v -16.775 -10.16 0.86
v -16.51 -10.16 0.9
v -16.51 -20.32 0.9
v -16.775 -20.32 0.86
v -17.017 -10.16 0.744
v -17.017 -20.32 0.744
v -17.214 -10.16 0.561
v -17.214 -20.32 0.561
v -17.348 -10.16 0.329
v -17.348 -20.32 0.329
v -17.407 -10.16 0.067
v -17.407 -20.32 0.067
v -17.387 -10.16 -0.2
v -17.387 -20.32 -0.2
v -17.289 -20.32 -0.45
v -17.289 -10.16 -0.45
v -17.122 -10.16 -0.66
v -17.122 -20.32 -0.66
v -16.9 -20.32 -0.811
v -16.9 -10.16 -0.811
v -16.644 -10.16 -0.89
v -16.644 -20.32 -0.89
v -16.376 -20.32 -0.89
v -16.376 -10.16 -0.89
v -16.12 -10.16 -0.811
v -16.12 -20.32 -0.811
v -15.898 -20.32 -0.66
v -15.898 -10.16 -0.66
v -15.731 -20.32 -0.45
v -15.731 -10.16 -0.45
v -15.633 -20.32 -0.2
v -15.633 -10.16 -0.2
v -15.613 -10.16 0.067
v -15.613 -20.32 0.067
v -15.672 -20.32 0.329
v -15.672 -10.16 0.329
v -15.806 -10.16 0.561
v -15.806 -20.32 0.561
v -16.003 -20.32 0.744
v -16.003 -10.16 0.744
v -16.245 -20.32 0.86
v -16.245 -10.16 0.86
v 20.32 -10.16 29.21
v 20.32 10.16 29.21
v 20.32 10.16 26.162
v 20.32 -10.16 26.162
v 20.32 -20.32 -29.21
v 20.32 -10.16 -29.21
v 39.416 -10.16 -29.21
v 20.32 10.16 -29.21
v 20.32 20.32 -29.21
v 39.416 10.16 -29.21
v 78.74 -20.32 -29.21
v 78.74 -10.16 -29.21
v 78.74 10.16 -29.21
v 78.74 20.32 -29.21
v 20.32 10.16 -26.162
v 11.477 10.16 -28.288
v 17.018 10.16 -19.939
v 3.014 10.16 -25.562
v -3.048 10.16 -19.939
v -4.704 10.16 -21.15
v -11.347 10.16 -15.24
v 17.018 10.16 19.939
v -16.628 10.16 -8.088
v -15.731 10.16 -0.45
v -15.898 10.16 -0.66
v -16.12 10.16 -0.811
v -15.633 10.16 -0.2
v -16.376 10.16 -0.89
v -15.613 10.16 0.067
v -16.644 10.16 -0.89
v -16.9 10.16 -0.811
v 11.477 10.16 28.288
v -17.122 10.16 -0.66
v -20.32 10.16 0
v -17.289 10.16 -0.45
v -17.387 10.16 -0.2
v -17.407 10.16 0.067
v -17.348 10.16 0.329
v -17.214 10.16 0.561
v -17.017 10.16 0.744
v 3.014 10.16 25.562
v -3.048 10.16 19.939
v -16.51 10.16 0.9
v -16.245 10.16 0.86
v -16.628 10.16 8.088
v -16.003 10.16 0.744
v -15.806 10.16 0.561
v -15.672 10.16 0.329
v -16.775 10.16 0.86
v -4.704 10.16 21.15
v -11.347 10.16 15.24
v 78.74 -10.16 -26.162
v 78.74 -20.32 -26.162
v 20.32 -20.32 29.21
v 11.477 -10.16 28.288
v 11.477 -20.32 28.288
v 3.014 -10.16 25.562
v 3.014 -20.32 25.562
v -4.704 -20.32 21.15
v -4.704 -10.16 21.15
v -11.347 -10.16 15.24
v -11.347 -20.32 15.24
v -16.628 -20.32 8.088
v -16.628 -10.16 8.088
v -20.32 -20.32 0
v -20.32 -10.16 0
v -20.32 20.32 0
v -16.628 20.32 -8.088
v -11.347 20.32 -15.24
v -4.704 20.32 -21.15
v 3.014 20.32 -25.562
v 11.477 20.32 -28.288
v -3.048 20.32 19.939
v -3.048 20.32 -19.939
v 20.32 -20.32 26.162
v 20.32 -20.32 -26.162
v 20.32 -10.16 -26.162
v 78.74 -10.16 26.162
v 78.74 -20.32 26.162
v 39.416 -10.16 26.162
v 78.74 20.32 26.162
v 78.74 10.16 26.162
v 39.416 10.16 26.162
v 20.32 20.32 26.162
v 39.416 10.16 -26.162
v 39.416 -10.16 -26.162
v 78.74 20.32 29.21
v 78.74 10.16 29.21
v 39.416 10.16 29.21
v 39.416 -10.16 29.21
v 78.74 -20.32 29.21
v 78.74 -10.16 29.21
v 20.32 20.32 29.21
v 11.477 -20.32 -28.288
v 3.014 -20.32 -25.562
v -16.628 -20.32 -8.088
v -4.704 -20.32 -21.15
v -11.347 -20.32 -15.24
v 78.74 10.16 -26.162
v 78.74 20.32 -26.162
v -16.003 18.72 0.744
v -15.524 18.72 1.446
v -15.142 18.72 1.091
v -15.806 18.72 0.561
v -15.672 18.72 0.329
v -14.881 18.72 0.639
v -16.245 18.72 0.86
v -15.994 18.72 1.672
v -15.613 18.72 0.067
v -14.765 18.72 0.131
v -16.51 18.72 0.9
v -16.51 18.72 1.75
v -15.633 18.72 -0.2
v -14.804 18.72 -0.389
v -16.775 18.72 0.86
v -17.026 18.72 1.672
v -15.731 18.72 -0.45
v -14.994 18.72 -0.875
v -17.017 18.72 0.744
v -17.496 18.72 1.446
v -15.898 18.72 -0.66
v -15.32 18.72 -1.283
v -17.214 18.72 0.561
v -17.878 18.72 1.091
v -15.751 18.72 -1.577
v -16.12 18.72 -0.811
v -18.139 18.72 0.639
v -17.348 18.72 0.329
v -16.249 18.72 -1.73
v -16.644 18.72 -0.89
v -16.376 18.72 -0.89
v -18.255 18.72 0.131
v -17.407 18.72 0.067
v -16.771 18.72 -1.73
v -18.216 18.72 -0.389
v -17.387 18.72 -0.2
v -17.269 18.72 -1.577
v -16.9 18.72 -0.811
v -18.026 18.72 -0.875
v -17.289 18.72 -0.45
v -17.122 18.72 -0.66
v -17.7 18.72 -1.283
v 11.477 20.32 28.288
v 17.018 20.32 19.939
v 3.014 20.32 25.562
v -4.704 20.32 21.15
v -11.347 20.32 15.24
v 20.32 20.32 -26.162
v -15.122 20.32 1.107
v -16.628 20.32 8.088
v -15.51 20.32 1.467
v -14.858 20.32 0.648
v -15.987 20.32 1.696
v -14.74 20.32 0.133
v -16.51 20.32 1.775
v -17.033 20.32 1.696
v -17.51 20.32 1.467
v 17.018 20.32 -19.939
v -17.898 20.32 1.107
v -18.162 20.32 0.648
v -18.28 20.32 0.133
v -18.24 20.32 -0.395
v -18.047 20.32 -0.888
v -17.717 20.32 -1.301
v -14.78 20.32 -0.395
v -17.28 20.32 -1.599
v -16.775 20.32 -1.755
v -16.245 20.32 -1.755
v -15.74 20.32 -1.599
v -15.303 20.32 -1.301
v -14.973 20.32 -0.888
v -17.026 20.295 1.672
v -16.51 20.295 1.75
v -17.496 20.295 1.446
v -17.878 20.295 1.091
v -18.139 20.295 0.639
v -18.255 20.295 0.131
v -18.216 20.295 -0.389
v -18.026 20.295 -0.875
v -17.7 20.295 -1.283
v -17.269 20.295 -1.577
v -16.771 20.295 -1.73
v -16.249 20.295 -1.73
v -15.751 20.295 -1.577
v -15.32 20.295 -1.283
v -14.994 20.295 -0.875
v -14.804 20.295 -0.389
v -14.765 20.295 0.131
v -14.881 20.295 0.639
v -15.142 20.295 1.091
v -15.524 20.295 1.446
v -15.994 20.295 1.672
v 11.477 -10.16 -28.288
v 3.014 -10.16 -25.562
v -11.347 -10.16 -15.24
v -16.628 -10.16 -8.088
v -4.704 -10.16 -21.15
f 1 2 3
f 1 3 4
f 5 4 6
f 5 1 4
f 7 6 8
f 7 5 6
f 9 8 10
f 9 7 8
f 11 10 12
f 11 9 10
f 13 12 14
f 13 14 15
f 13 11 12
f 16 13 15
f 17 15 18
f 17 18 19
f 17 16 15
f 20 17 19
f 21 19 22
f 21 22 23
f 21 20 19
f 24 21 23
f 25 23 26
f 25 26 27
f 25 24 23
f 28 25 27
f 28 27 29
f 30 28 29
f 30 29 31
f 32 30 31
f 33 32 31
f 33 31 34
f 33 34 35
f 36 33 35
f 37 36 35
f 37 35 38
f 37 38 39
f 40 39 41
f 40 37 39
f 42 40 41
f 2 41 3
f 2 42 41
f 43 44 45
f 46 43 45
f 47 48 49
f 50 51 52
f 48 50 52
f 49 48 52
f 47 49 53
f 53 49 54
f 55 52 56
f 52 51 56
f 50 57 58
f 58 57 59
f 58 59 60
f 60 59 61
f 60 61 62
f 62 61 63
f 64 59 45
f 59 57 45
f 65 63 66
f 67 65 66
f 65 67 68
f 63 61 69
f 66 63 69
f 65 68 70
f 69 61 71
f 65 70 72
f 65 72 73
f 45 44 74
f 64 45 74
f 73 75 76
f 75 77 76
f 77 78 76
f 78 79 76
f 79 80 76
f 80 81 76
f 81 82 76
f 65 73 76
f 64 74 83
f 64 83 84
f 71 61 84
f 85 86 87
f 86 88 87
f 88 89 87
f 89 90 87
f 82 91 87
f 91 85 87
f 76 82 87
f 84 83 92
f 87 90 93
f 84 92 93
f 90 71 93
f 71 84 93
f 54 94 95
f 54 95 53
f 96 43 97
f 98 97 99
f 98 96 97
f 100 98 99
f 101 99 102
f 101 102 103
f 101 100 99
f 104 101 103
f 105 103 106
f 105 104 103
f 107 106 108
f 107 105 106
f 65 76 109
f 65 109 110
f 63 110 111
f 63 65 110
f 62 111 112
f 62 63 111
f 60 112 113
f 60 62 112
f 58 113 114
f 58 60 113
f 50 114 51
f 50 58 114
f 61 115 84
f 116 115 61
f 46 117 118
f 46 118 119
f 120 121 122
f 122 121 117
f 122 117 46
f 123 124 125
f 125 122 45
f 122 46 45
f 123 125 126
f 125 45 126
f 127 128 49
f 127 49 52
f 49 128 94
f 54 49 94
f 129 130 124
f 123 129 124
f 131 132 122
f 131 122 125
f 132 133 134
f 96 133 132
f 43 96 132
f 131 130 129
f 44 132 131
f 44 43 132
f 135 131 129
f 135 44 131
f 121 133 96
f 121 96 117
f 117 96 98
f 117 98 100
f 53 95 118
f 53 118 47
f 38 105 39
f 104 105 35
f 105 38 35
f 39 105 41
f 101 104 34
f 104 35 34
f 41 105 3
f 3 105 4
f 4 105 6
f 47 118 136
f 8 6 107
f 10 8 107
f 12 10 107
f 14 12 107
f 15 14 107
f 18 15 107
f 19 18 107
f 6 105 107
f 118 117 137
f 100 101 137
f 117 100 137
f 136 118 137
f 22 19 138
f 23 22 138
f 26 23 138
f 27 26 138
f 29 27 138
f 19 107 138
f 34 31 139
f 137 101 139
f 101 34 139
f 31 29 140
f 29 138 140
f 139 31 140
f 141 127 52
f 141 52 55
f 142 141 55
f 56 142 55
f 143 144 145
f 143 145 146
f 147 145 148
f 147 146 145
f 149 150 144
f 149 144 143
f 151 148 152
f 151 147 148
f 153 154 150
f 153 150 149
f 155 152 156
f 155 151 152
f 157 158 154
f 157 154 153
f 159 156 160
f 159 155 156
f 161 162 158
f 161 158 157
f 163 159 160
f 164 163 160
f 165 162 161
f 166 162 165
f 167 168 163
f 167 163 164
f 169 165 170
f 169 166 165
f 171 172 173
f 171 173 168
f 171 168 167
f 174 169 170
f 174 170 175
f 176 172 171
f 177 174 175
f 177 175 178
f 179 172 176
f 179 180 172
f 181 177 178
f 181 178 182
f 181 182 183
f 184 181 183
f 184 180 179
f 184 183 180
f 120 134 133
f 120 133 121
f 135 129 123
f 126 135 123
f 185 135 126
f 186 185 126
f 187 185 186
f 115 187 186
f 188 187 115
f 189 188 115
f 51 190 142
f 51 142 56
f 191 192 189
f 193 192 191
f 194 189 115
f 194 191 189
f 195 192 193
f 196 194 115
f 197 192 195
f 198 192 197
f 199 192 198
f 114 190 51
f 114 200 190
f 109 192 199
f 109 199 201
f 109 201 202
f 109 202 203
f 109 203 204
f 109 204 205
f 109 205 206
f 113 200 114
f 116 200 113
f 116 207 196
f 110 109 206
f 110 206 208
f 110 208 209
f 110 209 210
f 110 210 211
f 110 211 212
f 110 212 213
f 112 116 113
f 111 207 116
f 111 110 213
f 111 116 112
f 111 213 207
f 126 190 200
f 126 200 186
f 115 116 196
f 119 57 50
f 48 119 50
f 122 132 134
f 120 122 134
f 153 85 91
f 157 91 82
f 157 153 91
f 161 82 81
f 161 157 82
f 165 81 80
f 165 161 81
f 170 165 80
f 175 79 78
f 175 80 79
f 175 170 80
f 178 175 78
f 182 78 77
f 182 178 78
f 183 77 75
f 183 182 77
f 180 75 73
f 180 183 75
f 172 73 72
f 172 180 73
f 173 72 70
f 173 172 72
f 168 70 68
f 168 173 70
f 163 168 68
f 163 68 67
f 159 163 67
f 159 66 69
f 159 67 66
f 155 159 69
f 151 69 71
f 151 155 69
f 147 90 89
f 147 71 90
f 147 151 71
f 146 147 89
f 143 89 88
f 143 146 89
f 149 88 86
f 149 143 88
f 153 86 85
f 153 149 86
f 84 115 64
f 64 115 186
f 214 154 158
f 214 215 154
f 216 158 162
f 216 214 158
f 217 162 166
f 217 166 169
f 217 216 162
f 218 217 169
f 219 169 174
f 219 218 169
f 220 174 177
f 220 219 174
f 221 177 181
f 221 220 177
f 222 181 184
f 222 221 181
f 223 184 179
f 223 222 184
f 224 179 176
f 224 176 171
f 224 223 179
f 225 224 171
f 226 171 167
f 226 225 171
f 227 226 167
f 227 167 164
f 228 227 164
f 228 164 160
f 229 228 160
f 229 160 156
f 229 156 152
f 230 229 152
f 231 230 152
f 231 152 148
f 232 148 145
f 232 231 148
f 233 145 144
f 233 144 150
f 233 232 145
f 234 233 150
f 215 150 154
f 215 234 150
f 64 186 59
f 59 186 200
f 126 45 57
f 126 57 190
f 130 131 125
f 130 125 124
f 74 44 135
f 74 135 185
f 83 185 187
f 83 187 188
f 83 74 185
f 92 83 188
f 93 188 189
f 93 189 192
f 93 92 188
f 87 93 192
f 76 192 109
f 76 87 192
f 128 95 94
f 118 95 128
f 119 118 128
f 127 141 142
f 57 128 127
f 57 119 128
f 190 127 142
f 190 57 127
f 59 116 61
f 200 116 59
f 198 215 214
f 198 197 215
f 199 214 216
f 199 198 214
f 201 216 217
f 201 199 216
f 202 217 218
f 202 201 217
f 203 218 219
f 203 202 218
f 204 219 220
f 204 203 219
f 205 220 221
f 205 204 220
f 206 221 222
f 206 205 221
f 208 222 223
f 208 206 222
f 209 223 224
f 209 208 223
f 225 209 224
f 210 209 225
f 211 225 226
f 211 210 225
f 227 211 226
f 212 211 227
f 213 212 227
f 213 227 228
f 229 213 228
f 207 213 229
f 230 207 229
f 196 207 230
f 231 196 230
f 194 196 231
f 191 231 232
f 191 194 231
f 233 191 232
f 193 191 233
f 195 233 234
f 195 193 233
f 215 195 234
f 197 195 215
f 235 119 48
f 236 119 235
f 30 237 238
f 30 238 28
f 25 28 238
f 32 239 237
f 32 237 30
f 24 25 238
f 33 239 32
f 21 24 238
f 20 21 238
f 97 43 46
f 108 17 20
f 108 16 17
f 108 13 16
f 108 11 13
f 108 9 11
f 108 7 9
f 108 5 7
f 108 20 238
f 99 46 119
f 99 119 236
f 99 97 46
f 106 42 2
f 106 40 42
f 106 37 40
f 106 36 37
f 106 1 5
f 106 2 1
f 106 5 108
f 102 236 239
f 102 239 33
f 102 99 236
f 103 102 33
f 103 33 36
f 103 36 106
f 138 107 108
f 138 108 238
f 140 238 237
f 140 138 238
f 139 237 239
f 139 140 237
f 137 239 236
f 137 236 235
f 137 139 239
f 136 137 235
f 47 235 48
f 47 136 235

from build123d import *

# Parameters (mm, degrees)
SKETCH1_W           = 20.32
SKETCH1_H           = 10.16
BOSS_EXTRUDE1_DEPTH = 29.21
SKETCH1_4_W         = 40.64
SKETCH1_4_H         = 10.16
BOSS_EXTRUDE2_DEPTH = 29.21
SKETCH5_W           = 3.048
SKETCH5_H           = 40.64
BOSS_EXTRUDE4_DEPTH = 58.42
SKETCH10_W          = 39.323622634
SKETCH10_H          = 20.32
CUT_EXTRUDE2_DEPTH  = 101.12884899
CUT_EXTRUDE4_DEPTH  = 58.42
CUT_EXTRUDE5_REACH  = 95.3
SKETCH13_W          = 20.066
SKETCH13_H          = 39.878


with BuildPart() as part:
    # Sketch1 → Boss-Extrude1 (new, symmetric)
    with BuildSketch(Plane.XY):
        with Locations((-10.16, 15.24)):
            Rectangle(SKETCH1_W, SKETCH1_H)
    boss_extrude1 = extrude(amount=BOSS_EXTRUDE1_DEPTH, both=True)

    # Mirror1: Boss-Extrude1 across plane
    add(boss_extrude1.mirror(Plane(origin=(0, 0, 0), x_dir=(0, 0, 1), z_dir=(1, 0, 0))))



with BuildPart() as body_2:
    # Sketch1<4> → Boss-Extrude2 (new, symmetric)
    with BuildSketch(Plane.XY):
        with Locations((0, -15.24)):
            Rectangle(SKETCH1_4_W, SKETCH1_4_H)
    extrude(amount=BOSS_EXTRUDE2_DEPTH, both=True)


with BuildPart() as part_1:
    add(part.part)

    add(body_2.part)  # Boss-Extrude4 merges body 2
    # Sketch5 → Boss-Extrude4 (add)
    with BuildSketch(Plane(origin=(20.32, 0, 0), x_dir=(0, 0, -1), z_dir=(1, 0, 0))):
        with Locations((-27.686, 0)):
            Rectangle(SKETCH5_W, SKETCH5_H)
        with Locations((27.686, 0)):
            Rectangle(SKETCH5_W, SKETCH5_H)
    extrude(amount=BOSS_EXTRUDE4_DEPTH)

    # Sketch8 → CBORE for M1.6 SHCS1 (revolve, cut)
    with BuildSketch(Plane(origin=(-16.51, 20.32, 0), x_dir=(0, 0, 1), z_dir=(1, 0, 0))):
        Polygon((0, 0), (0, 40.64), (0.9, 40.64), (0.9, 1.6), (1.75, 1.6), (1.75, 0.025), (1.775, 0), align=None)
    revolve(axis=Axis((-16.51, 26.67, 0), (0, -1, 0)), mode=Mode.SUBTRACT)

    # Sketch10 → Cut-Extrude2 (cut, through all)
    with BuildSketch(Plane.XY.offset(29.21)):
        with Locations((59.078188683, 0)):
            Rectangle(SKETCH10_W, SKETCH10_H)
    extrude(amount=-CUT_EXTRUDE2_DEPTH, mode=Mode.SUBTRACT)

    # Sketch12 → Cut-Extrude4 (cut)
    with BuildSketch(Plane(origin=(0, 20.32, 0), x_dir=(1, 0, 0), z_dir=(0, 1, 0))):
        with BuildLine():
            Line((-20.32, 29.21), (-20.32, 0))
            ThreePointArc((-20.32, 0), (-4.704156829, 21.149913849), (20.32, 29.21))
            Line((20.32, 29.21), (-20.32, 29.21))
        make_face()
        with BuildLine():
            Line((-20.32, 0), (-20.32, -29.21))
            Line((-20.32, -29.21), (20.32, -29.21))
            ThreePointArc((20.32, -29.21), (-4.704156829, -21.149913849), (-20.32, 0))
        make_face()
    extrude(amount=-CUT_EXTRUDE4_DEPTH, mode=Mode.SUBTRACT)

    # Sketch13 → Cut-Extrude5 (cut, up to next)
    with BuildSketch(Plane(origin=(0, 20.32, 0), x_dir=(1, 0, 0), z_dir=(0, 1, 0)), mode=Mode.PRIVATE) as cut_extrude5_sk1:
        with Locations((6.985, 0)):
            Rectangle(SKETCH13_W, SKETCH13_H)
    cut_extrude5_tool1 = extrude(cut_extrude5_sk1.sketch, amount=-CUT_EXTRUDE5_REACH, mode=Mode.PRIVATE) & part_1.part
    add(cut_extrude5_tool1.solids().sort_by_distance((6.985, 20.32, 0))[0], mode=Mode.SUBTRACT)


solid = part_1.part
